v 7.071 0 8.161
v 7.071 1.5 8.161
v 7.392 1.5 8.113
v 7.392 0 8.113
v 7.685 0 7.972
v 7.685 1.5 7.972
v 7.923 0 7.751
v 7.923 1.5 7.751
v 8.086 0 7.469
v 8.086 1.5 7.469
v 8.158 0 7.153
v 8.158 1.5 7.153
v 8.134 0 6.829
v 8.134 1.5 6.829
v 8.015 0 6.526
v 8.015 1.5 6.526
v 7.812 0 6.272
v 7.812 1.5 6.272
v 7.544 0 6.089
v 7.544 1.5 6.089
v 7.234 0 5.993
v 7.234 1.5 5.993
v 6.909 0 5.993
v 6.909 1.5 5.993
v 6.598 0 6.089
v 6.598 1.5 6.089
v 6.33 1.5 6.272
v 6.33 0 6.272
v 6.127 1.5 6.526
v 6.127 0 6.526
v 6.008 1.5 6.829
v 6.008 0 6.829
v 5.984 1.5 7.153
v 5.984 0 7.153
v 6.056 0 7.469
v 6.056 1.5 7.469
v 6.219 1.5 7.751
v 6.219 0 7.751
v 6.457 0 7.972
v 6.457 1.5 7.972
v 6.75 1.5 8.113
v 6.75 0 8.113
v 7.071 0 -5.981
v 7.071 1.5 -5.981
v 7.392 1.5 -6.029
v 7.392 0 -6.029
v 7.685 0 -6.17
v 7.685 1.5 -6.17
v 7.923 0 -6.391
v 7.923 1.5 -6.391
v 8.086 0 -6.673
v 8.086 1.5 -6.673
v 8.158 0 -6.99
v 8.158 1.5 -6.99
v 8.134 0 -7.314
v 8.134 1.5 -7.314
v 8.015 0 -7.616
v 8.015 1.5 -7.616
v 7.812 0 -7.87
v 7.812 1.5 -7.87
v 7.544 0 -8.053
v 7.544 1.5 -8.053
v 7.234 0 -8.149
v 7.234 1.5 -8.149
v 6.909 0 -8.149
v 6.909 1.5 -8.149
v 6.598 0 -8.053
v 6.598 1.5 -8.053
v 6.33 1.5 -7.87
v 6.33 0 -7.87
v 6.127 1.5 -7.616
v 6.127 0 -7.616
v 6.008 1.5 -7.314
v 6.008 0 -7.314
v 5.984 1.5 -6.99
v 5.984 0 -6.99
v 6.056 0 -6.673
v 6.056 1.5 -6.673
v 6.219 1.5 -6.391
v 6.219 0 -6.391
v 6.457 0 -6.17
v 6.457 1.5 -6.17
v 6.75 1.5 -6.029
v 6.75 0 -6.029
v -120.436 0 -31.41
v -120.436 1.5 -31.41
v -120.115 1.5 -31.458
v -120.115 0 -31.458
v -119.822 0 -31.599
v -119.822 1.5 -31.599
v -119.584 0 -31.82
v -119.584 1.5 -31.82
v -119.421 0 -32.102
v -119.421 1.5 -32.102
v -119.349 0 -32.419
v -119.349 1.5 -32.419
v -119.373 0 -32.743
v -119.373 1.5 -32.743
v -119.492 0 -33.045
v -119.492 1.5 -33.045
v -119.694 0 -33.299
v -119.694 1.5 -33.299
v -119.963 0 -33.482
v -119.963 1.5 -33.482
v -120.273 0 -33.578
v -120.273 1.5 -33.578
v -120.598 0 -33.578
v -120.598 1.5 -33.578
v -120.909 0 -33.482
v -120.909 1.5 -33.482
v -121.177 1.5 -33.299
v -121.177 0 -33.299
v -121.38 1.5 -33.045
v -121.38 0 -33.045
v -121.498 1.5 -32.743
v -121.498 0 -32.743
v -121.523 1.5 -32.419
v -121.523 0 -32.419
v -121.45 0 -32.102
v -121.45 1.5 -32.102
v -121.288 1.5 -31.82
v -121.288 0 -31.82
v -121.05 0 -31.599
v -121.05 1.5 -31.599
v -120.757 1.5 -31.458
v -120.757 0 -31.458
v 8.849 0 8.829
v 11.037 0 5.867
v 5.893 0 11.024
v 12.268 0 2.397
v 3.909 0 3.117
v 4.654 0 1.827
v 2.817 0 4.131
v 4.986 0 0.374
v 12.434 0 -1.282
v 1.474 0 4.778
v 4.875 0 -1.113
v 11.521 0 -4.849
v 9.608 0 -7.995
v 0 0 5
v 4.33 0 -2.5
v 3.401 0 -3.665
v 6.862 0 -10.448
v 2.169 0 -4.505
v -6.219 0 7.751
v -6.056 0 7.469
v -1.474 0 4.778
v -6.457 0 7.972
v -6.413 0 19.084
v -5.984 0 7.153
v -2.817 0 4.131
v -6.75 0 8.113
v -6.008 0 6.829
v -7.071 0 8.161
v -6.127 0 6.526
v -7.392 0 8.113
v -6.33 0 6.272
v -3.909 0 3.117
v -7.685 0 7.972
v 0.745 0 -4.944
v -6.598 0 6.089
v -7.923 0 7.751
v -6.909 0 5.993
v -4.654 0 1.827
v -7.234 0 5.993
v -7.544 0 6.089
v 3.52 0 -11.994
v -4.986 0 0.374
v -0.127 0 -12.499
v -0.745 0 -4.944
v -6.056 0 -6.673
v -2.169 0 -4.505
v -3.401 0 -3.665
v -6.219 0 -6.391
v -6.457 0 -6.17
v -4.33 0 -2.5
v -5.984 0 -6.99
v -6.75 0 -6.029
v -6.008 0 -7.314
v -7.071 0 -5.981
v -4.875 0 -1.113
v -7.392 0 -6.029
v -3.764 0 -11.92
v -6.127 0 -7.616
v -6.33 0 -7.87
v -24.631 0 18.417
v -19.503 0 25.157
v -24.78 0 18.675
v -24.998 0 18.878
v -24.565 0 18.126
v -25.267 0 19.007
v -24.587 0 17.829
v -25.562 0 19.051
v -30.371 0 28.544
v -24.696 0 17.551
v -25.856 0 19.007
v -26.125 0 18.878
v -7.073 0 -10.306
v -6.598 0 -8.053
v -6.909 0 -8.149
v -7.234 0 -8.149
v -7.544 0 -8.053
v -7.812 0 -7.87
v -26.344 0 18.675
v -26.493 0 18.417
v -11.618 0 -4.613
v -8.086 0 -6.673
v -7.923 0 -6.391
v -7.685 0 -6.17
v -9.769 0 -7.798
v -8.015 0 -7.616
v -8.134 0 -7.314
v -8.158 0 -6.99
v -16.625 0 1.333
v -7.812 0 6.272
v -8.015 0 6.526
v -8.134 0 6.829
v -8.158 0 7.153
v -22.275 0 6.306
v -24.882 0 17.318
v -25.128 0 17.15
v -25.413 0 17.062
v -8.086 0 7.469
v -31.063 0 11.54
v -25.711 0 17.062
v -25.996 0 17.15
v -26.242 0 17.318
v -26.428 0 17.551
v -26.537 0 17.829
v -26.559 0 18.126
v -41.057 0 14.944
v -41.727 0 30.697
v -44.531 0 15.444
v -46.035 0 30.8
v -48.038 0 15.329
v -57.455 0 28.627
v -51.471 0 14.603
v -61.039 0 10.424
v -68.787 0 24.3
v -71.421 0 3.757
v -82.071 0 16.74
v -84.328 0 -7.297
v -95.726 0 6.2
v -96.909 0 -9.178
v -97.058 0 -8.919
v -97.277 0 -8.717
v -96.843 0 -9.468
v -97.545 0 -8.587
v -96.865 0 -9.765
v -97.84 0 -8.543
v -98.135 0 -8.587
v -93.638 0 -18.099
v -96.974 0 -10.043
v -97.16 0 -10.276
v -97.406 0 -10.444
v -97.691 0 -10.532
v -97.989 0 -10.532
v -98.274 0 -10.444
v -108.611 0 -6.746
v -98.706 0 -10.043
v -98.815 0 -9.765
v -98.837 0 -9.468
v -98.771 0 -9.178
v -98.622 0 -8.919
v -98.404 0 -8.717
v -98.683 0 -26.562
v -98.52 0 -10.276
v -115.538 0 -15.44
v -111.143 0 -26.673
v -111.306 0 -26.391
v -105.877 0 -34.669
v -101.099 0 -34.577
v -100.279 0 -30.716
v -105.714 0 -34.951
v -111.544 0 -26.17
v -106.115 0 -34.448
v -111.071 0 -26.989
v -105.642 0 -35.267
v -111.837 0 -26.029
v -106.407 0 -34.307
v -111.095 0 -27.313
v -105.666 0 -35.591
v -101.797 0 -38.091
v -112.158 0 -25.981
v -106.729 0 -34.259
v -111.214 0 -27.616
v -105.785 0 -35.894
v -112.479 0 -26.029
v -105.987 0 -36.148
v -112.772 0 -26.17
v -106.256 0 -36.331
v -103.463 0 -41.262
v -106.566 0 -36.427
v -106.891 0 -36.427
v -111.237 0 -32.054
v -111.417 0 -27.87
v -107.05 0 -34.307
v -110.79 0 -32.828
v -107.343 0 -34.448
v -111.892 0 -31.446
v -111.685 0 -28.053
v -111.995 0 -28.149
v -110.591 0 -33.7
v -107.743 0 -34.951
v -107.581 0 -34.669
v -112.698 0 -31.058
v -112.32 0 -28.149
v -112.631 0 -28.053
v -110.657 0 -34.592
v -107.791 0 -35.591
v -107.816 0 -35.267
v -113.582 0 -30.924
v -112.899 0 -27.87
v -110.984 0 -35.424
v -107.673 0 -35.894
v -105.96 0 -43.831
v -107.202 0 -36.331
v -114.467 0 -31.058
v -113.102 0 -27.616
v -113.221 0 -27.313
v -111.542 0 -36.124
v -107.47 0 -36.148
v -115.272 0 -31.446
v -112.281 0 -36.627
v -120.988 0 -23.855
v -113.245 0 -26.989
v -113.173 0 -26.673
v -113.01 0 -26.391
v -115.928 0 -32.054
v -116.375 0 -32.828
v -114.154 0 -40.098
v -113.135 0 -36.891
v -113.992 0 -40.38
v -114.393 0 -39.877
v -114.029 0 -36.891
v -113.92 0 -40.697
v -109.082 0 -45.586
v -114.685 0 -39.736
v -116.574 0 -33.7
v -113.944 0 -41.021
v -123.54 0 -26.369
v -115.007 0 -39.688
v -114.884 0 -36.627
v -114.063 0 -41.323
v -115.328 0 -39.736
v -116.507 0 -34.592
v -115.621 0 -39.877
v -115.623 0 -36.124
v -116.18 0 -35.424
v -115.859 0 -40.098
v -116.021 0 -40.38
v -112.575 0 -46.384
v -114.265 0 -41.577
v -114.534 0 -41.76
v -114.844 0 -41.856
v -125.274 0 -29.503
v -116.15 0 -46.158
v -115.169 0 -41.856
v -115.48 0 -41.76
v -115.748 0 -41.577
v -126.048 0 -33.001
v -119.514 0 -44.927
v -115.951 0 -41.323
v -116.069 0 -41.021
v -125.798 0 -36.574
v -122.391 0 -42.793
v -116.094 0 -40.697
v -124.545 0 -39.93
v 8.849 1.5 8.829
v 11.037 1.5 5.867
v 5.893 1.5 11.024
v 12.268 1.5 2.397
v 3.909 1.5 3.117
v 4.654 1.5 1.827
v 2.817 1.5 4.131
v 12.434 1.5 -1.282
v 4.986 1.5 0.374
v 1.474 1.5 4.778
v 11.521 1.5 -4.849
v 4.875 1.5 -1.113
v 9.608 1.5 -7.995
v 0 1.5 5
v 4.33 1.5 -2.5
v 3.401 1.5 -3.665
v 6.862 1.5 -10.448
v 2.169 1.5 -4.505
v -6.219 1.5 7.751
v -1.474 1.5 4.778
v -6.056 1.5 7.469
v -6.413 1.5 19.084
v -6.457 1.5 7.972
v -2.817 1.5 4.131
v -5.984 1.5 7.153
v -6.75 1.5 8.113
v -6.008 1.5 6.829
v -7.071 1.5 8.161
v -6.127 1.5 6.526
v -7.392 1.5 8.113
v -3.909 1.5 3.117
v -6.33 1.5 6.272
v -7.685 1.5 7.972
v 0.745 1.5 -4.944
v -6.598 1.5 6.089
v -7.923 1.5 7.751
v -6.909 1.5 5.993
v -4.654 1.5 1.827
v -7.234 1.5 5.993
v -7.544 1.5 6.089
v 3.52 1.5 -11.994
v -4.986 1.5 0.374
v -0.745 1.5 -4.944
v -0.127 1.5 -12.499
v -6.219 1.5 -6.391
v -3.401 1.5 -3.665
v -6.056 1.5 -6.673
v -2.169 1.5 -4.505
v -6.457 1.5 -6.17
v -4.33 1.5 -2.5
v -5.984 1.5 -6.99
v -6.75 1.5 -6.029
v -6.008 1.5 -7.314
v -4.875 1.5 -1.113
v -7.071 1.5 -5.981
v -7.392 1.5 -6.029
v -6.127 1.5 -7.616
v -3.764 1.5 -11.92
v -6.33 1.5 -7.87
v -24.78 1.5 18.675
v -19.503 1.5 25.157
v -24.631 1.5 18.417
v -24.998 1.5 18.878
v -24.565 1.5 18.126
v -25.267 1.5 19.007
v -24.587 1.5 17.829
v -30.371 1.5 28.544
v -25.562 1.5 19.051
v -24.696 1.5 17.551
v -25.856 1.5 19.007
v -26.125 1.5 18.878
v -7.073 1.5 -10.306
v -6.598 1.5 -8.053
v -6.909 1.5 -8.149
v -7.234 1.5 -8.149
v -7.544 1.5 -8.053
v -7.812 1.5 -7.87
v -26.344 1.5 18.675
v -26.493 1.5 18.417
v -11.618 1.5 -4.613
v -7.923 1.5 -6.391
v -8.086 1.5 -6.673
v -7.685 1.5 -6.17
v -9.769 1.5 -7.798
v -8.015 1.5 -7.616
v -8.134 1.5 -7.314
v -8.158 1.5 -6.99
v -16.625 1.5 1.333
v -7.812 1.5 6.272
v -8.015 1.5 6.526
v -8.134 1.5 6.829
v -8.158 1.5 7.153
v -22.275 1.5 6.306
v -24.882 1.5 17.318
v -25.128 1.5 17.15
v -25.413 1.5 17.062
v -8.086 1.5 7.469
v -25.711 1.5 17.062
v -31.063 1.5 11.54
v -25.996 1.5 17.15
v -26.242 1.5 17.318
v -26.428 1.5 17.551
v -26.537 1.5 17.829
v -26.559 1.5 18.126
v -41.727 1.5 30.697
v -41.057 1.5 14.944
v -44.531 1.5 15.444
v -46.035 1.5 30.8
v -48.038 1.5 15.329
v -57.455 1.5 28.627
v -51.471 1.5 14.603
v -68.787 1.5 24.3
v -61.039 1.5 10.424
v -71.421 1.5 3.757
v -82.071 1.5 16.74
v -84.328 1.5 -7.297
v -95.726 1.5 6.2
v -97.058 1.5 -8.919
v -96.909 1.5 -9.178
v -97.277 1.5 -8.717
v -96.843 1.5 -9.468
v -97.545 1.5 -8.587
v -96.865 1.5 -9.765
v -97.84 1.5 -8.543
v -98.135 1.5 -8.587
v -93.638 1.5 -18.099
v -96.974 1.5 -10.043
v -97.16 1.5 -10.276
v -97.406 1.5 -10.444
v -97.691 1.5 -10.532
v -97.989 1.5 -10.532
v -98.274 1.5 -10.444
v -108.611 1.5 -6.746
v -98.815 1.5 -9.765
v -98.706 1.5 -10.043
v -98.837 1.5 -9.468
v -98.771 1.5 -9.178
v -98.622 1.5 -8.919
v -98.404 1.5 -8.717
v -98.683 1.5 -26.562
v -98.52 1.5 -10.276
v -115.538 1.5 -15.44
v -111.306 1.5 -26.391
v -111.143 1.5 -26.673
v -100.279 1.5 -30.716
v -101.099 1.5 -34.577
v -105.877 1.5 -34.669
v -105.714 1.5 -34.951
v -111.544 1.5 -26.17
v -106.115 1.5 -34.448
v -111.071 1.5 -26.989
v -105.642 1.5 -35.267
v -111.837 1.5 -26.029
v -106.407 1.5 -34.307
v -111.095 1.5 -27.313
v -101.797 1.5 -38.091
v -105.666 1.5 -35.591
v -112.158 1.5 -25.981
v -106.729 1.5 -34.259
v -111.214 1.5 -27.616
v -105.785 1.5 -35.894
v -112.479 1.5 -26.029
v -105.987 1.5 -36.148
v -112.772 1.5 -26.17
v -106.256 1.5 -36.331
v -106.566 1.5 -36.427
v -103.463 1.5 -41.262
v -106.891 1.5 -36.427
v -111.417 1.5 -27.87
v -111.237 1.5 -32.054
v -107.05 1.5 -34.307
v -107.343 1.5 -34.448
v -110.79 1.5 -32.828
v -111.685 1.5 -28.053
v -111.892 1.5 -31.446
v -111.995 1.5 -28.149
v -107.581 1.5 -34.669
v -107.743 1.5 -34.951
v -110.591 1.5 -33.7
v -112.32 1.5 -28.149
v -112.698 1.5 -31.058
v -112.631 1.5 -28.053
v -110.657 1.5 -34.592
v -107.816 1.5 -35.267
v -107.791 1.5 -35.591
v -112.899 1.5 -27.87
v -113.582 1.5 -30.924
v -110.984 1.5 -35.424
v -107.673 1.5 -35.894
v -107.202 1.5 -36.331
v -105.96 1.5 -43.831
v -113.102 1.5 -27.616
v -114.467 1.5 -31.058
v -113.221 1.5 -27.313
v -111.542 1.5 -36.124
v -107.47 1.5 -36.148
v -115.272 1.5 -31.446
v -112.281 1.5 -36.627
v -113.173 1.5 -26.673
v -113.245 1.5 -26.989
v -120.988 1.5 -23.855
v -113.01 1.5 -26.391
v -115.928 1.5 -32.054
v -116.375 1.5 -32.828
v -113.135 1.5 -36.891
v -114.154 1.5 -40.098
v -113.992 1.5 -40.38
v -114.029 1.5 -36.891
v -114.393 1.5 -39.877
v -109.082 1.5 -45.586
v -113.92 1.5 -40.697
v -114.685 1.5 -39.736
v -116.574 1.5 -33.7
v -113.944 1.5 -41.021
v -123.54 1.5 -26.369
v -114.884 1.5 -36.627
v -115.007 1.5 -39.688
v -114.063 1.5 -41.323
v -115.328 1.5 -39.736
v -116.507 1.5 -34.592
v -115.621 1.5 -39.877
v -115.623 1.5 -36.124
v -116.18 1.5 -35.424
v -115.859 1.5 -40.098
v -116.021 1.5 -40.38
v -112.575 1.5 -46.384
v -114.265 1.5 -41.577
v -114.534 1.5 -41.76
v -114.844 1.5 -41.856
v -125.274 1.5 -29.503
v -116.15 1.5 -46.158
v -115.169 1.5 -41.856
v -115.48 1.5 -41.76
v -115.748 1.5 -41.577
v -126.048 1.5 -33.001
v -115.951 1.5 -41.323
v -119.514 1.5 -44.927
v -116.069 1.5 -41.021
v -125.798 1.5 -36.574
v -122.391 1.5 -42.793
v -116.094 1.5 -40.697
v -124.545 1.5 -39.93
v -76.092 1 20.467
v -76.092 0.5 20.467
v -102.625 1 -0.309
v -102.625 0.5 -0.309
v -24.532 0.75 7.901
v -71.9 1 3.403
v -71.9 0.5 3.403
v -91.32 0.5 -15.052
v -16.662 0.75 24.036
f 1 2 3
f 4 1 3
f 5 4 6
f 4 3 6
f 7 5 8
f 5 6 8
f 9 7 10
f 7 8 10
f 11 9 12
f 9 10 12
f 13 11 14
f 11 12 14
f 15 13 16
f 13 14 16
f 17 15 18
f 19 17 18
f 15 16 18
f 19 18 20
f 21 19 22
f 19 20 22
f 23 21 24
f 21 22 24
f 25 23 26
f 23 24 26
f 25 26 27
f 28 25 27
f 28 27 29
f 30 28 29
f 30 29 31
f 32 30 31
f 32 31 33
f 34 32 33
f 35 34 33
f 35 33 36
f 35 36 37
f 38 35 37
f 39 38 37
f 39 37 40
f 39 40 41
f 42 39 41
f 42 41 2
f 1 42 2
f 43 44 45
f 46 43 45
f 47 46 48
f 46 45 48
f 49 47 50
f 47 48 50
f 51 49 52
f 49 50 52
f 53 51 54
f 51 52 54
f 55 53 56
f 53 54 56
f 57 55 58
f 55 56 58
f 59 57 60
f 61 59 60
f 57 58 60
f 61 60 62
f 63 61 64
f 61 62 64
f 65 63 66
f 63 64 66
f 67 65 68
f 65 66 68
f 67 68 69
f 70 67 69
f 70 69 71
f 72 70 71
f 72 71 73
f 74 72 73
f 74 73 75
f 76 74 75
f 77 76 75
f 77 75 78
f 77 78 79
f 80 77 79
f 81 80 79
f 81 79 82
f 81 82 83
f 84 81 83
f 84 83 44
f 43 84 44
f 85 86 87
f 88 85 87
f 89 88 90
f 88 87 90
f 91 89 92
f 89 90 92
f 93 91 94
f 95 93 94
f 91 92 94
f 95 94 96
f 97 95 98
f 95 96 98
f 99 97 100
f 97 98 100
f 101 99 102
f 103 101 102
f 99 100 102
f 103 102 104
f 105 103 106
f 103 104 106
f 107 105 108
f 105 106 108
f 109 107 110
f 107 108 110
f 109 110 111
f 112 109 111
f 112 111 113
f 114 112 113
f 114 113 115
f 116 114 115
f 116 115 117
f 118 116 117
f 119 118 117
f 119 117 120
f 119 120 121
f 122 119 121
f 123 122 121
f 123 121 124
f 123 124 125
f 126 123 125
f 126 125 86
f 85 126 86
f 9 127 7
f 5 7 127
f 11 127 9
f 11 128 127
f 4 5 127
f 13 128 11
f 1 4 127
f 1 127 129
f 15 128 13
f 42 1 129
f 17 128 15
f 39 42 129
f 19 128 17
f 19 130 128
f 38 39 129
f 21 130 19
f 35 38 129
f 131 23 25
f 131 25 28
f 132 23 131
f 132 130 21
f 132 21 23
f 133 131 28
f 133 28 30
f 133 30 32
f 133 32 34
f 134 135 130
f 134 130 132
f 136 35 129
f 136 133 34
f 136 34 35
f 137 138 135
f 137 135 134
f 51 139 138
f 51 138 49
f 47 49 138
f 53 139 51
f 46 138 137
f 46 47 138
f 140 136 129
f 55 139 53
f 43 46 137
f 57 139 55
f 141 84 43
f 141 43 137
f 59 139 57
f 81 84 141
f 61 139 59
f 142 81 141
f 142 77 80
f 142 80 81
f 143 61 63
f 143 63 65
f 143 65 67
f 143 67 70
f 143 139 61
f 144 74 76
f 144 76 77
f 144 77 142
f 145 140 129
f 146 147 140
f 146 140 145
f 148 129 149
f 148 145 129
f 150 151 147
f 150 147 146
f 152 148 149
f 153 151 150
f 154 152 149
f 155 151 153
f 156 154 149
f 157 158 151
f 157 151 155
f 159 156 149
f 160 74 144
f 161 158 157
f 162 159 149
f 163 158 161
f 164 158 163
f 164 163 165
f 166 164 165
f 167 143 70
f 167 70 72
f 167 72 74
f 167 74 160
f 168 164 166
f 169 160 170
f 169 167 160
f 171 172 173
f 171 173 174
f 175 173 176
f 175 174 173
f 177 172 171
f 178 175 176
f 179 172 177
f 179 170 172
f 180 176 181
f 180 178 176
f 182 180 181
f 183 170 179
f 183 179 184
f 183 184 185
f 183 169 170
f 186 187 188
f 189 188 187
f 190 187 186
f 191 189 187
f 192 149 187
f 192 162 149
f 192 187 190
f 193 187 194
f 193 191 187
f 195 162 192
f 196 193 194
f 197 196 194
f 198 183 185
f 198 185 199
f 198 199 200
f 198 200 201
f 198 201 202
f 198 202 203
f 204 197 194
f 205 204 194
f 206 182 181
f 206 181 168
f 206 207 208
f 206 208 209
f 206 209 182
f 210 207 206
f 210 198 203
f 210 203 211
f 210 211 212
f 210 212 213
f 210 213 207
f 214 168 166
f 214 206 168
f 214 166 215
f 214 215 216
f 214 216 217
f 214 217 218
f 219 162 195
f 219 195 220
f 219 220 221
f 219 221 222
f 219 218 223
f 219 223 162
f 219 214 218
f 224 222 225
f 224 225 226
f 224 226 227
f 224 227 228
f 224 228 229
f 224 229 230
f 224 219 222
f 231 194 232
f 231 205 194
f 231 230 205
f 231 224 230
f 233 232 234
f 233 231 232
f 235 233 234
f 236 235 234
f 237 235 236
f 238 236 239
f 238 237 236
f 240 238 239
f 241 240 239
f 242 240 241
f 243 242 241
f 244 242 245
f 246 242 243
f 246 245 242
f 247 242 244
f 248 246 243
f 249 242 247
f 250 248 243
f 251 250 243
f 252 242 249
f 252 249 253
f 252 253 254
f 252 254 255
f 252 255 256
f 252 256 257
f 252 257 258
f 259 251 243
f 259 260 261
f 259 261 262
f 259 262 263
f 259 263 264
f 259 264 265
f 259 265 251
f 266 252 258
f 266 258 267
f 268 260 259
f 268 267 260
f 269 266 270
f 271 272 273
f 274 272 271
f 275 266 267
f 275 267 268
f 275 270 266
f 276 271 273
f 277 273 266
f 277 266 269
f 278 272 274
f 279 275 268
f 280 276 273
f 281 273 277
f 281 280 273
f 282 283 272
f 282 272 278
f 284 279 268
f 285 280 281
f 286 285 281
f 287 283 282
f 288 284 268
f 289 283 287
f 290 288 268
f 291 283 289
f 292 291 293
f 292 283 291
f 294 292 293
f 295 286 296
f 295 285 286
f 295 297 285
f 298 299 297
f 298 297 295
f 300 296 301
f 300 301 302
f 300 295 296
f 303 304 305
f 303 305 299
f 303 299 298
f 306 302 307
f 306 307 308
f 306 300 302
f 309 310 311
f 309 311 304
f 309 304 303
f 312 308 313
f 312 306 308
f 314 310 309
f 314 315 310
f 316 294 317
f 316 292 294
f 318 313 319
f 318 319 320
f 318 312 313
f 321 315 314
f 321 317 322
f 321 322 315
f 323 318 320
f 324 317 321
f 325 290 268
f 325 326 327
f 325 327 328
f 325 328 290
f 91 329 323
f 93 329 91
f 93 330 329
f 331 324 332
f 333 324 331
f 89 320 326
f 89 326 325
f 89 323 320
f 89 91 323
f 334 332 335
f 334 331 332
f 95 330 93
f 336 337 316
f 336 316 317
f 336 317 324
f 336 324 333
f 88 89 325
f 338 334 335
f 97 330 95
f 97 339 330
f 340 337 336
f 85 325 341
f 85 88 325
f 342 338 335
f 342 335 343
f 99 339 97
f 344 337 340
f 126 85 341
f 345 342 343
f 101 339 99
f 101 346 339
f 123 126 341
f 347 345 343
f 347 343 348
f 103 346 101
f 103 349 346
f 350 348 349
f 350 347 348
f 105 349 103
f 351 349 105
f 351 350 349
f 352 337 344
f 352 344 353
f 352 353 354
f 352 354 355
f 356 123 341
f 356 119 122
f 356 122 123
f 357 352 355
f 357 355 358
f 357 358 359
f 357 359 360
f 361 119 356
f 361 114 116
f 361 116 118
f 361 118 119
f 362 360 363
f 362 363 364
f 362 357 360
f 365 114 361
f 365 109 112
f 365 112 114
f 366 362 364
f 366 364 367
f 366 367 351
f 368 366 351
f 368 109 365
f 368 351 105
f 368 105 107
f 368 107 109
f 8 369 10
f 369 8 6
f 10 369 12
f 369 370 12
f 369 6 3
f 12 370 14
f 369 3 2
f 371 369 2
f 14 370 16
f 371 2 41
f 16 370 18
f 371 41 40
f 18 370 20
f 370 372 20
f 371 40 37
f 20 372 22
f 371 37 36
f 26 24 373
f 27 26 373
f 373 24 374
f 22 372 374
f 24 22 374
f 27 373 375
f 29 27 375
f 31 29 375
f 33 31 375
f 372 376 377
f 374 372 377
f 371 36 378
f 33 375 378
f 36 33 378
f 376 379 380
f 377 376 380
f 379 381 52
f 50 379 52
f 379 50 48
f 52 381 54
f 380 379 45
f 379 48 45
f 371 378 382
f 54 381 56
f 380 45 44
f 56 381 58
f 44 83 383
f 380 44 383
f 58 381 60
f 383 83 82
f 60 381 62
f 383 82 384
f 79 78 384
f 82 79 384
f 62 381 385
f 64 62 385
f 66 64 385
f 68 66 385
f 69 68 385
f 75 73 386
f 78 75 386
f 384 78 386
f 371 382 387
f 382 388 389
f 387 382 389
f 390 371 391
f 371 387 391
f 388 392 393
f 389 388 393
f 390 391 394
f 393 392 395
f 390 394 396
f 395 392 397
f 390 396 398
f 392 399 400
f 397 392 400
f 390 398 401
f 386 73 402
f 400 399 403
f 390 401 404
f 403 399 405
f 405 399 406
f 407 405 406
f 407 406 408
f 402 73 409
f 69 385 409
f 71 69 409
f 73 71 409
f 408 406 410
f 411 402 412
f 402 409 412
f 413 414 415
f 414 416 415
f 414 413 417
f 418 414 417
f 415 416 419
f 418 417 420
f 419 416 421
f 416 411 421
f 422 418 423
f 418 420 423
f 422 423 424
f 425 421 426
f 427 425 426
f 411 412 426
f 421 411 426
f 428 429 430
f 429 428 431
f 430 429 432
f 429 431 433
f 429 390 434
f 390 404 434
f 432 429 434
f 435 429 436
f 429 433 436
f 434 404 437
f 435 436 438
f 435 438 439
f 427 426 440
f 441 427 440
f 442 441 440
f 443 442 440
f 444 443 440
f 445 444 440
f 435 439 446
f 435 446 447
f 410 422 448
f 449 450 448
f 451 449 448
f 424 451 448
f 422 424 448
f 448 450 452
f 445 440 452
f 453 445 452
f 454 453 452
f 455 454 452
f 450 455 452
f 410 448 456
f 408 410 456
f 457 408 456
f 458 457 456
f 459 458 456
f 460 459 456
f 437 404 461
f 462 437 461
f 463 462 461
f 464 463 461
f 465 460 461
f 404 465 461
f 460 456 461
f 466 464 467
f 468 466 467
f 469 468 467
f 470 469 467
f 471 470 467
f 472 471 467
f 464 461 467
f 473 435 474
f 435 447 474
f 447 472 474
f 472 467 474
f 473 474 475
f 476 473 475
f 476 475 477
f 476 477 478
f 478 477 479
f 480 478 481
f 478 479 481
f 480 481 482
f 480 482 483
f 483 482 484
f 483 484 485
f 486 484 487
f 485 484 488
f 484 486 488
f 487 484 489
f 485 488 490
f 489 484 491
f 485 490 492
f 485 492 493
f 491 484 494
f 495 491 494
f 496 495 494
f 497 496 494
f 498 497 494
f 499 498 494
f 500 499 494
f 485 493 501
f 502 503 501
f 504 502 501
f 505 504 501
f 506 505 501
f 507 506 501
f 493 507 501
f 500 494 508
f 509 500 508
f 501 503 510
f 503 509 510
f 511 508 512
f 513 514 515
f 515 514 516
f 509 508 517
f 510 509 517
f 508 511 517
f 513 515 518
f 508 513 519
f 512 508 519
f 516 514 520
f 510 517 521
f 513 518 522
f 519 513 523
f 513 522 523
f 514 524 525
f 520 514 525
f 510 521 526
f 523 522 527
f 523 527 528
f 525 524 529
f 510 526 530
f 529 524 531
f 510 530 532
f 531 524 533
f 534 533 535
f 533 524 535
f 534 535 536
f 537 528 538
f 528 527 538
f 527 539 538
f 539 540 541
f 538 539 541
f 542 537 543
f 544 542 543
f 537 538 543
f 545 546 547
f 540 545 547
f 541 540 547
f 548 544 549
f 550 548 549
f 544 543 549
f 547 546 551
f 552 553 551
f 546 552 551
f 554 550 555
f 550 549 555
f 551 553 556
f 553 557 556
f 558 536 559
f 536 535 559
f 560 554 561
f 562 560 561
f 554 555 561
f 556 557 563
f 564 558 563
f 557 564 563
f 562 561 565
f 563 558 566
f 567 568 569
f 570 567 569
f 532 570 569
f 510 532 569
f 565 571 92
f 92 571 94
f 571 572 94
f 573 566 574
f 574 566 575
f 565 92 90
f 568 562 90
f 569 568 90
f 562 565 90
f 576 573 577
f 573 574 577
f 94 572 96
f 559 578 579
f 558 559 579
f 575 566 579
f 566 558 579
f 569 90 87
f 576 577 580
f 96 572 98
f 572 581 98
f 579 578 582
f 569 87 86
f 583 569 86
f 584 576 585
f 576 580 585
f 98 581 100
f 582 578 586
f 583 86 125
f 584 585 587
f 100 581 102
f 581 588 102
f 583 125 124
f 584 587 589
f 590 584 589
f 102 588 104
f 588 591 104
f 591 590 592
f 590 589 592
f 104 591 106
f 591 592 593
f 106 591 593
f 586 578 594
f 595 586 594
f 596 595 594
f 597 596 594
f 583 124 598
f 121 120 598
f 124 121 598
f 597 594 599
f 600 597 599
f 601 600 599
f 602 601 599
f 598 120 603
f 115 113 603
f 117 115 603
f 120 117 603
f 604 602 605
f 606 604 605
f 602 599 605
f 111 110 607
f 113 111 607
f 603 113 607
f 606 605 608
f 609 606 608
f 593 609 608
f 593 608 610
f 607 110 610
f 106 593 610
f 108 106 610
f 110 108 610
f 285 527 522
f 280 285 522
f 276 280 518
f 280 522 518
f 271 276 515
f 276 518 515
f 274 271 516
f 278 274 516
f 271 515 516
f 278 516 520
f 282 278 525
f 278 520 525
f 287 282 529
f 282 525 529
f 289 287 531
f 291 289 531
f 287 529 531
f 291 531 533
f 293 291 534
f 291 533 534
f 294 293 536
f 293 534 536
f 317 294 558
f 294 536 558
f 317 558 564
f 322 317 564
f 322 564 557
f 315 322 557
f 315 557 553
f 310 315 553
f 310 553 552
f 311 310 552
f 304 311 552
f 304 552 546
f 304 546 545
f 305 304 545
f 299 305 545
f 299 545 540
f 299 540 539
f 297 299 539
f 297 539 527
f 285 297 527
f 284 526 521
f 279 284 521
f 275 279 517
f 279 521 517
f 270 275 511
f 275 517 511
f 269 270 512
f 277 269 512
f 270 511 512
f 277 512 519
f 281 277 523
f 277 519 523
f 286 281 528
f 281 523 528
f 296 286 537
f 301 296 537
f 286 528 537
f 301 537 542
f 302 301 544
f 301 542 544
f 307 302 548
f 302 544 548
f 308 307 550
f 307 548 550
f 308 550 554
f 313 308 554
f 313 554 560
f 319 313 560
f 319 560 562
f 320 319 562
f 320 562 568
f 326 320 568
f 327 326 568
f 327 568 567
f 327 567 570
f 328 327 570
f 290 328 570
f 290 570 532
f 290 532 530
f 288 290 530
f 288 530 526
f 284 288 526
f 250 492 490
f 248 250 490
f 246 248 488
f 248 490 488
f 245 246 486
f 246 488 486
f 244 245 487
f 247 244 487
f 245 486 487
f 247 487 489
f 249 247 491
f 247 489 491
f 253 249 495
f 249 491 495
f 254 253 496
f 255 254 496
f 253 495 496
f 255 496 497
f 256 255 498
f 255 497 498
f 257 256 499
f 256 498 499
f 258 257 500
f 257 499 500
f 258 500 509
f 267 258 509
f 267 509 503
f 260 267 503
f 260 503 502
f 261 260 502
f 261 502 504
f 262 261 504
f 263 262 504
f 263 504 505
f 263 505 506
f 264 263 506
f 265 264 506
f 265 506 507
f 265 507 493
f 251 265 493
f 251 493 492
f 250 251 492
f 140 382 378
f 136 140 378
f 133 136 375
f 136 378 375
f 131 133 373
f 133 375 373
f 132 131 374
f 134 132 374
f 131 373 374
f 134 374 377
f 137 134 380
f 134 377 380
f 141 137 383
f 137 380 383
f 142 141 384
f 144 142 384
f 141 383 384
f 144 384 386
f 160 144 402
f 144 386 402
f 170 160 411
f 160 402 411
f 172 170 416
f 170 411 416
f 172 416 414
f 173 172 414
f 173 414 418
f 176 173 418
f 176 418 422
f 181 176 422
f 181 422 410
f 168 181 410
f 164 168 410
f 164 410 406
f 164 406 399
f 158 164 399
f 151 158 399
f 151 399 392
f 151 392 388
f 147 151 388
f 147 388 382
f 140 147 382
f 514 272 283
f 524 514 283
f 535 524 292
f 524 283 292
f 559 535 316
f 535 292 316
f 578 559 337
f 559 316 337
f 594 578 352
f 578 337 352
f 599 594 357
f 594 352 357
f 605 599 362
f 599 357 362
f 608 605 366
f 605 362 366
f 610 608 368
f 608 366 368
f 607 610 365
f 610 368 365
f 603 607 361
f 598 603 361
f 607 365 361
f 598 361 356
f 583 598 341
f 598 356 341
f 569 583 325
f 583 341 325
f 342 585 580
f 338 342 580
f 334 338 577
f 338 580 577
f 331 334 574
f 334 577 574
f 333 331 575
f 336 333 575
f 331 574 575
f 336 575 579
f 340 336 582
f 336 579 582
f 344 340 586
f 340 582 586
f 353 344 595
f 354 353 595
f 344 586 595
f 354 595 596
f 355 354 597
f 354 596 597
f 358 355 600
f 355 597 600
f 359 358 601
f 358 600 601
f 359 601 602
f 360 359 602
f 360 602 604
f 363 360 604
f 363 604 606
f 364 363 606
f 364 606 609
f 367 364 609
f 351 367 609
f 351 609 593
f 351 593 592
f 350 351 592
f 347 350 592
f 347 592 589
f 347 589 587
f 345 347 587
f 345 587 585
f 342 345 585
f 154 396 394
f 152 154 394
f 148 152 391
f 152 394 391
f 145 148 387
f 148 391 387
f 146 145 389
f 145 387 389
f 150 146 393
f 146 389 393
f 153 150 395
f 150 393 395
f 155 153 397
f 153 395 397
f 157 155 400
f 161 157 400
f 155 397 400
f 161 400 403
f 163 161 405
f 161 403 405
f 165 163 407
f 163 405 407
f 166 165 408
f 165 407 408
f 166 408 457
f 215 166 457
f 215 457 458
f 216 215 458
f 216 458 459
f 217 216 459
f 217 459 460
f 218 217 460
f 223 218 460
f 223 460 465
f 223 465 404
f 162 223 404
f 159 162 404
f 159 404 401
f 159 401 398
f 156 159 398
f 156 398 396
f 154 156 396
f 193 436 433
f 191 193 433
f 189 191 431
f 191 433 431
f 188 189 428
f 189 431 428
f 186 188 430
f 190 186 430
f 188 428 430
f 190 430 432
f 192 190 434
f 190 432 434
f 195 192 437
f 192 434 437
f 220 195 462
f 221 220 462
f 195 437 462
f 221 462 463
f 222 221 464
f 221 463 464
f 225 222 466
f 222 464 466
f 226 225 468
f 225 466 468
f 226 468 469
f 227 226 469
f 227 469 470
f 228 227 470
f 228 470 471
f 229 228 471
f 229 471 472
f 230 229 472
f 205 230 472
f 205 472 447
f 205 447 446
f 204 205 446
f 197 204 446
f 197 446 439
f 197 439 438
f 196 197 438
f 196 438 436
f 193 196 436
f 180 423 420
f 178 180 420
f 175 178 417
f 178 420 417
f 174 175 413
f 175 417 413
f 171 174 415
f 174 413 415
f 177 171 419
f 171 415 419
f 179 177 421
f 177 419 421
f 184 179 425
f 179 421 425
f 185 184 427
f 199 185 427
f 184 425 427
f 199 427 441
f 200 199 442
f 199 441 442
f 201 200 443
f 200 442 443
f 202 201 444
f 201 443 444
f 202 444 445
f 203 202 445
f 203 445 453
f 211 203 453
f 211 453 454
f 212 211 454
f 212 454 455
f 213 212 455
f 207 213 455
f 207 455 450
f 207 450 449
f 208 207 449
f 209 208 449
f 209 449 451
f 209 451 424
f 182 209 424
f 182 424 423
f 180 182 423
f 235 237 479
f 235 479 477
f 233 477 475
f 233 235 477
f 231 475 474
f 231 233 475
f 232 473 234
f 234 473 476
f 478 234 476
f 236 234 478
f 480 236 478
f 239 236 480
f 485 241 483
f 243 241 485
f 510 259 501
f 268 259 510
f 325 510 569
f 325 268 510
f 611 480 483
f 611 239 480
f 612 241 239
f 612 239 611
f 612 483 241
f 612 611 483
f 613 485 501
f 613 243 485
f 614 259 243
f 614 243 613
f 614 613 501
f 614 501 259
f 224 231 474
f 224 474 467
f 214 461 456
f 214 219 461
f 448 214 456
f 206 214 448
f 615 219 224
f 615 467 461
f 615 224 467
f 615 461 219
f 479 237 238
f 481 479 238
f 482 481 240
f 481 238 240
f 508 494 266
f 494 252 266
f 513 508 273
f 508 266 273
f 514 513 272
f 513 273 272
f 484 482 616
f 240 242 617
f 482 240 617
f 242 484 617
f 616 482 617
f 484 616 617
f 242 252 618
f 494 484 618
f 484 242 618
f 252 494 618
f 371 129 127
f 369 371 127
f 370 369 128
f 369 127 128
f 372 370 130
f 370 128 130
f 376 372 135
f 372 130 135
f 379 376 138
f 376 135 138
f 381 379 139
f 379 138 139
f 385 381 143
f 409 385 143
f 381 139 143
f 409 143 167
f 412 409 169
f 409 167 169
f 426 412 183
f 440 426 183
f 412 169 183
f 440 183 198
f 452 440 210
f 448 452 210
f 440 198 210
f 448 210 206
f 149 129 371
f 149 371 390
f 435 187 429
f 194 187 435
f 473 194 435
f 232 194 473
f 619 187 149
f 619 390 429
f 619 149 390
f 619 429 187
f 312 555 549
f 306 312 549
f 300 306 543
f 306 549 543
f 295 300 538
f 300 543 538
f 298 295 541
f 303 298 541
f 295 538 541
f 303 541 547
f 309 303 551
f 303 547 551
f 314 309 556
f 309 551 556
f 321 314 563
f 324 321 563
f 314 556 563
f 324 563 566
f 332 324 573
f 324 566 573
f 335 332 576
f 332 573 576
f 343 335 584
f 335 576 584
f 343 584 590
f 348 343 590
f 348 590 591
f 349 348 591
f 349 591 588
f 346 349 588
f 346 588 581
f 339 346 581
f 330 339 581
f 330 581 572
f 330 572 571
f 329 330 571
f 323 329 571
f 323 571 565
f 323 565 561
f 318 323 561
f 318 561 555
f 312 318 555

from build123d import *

# Parameters (mm, degrees)
BOSS_EXTRUDE1_DEPTH = 1.5
FILLET2_R           = 20
FILLET3_R           = 20
SKETCH3_R           = 5
SKETCH3_R_2         = 1.09
SKETCH3_R_3         = 3
CUT_EXTRUDE2_DEPTH  = 10
SKETCH4_R           = 1
CUT_EXTRUDE3_DEPTH  = 10


with BuildPart() as part:
    # Sketch2 → Boss-Extrude1 (new body)
    with BuildSketch(Plane(origin=(0, 0, 0), x_dir=(1, 0, 0), z_dir=(0, 1, 0))):
        with BuildLine():
            ThreePointArc((5.892711217, -11.0238811), (8.326059469, 9.323450741), (-11.617581648, 4.613219771))
            add(Edge.make_bspline(
                [(-44.514894976, -15.648119029), (-23.754992487, -12.049932399), (-11.617581648, 4.613219771)],
                knots=[0, 0, 0, 1, 1, 1], degree=2))
            add(Edge.make_bspline(
                [(-44.514894976, -15.648119029), (-60.493246192, -16.620966096), (-98.719374485, 13.99401616), (-101.099323327, 34.577284328)],
                knots=[0, 0, 0, 0, 1, 1, 1, 1], degree=3))
            ThreePointArc((-101.099323327, 34.577284328), (-119.514224633, 44.92723863), (-120.988196928, 23.854565571))
            add(Edge.make_bspline(
                [(-43.715031798, -30.941916126), (-74.6558876, -29.772176263), (-107.934743734, 0.909272839), (-120.988196928, 23.854565571)],
                knots=[0, 0, 0, 0, 1, 1, 1, 1], degree=3))
            add(Edge.make_bspline(
                [(5.892711217, -11.0238811), (-16.208282922, -27.819747246), (-43.715031798, -30.941916126)],
                knots=[0, 0, 0, 1, 1, 1], degree=2))
        make_face()
    extrude(amount=BOSS_EXTRUDE1_DEPTH)

    # Fillet2
    # the kernel refuses this fillet: 20 mm, written as the material it adds along each edge
    with BuildSketch(Plane(origin=(-44.514894976, 0, 15.648119029), x_dir=(0.9799001058370423, 0, -0.1994888031458243), z_dir=(0, 1, 0))) as fillet2_piece_1:
        with BuildLine():
            CenterArc((2.930109572, 19.991048267), FILLET2_R, 241.517996045, 30.196325972)
            Line((-6.607544605, 2.411709462), (-6.798297688, 2.060122686))
            ThreePointArc((-6.798297688, 2.060122686), (-3.555192588, 0.548576642), (-0.055827526, -0.39608495))
            Line((-0.055827526, -0.39608495), (-0.011685269, -0.399829282))
            ThreePointArc((-0.011685269, -0.399829282), (1.764140792, -0.426085985), (3.540398002, -0.399820965))
            Line((3.540398002, -0.399820965), (3.528431562, 0))
        make_face()
    extrude(amount=1.5)

    # Fillet3
    fillet3_edges = [part.edges().sort_by_distance(p)[0] for p in [
        (-43.715031798, 0.75, 30.941916126),
    ]]
    fillet(fillet3_edges, radius=FILLET3_R)

    # Sketch3 → Cut-Extrude2 (cut)
    with BuildSketch(Plane(origin=(0, 1.5, 0), x_dir=(1, 0, 0), z_dir=(0, 1, 0))):
        with Locations(Location((0, 0, 0), (0, 0, 270))):
            Circle(SKETCH3_R)
        with Locations(Location((-7.071067812, 7.071067812, 0), (0, 0, 270))):
            Circle(SKETCH3_R_2)
        with Locations(Location((7.071067812, 7.071067812, 0), (0, 0, 270))):
            Circle(SKETCH3_R_2)
        with Locations(Location((7.071067812, -7.071067812, 0), (0, 0, 270))):
            Circle(SKETCH3_R_2)
        with Locations(Location((-7.071067812, -7.071067812, 0), (0, 0, 270))):
            Circle(SKETCH3_R_2)
        with Locations(Location((-113.582262859, 33.924428557, 0), (0, 0, 270))):
            Circle(SKETCH3_R_3)
        with Locations(Location((-106.728711554, 35.34880018, 0), (0, 0, 270))):
            Circle(SKETCH3_R_2)
        with Locations(Location((-112.157891236, 27.070877253, 0), (0, 0, 270))):
            Circle(SKETCH3_R_2)
        with Locations(Location((-120.435814163, 32.500056934, 0), (0, 0, 270))):
            Circle(SKETCH3_R_2)
        with Locations(Location((-115.006634482, 40.777979862, 0), (0, 0, 270))):
            Circle(SKETCH3_R_2)
    extrude(amount=-CUT_EXTRUDE2_DEPTH, mode=Mode.SUBTRACT)

    # Sketch4 → Cut-Extrude3 (cut)
    with BuildSketch(Plane(origin=(0, 1.5, 0), x_dir=(1, 0, 0), z_dir=(0, 1, 0))):
        with Locations(Location((-97.840235061, 9.542968429, 0), (0, 0, 270))):
            Circle(SKETCH4_R)
        with Locations(Location((-25.561724323, -18.05130401, 0), (0, 0, 270))):
            Circle(SKETCH4_R)
    extrude(amount=-CUT_EXTRUDE3_DEPTH, mode=Mode.SUBTRACT)


solid = part.part
